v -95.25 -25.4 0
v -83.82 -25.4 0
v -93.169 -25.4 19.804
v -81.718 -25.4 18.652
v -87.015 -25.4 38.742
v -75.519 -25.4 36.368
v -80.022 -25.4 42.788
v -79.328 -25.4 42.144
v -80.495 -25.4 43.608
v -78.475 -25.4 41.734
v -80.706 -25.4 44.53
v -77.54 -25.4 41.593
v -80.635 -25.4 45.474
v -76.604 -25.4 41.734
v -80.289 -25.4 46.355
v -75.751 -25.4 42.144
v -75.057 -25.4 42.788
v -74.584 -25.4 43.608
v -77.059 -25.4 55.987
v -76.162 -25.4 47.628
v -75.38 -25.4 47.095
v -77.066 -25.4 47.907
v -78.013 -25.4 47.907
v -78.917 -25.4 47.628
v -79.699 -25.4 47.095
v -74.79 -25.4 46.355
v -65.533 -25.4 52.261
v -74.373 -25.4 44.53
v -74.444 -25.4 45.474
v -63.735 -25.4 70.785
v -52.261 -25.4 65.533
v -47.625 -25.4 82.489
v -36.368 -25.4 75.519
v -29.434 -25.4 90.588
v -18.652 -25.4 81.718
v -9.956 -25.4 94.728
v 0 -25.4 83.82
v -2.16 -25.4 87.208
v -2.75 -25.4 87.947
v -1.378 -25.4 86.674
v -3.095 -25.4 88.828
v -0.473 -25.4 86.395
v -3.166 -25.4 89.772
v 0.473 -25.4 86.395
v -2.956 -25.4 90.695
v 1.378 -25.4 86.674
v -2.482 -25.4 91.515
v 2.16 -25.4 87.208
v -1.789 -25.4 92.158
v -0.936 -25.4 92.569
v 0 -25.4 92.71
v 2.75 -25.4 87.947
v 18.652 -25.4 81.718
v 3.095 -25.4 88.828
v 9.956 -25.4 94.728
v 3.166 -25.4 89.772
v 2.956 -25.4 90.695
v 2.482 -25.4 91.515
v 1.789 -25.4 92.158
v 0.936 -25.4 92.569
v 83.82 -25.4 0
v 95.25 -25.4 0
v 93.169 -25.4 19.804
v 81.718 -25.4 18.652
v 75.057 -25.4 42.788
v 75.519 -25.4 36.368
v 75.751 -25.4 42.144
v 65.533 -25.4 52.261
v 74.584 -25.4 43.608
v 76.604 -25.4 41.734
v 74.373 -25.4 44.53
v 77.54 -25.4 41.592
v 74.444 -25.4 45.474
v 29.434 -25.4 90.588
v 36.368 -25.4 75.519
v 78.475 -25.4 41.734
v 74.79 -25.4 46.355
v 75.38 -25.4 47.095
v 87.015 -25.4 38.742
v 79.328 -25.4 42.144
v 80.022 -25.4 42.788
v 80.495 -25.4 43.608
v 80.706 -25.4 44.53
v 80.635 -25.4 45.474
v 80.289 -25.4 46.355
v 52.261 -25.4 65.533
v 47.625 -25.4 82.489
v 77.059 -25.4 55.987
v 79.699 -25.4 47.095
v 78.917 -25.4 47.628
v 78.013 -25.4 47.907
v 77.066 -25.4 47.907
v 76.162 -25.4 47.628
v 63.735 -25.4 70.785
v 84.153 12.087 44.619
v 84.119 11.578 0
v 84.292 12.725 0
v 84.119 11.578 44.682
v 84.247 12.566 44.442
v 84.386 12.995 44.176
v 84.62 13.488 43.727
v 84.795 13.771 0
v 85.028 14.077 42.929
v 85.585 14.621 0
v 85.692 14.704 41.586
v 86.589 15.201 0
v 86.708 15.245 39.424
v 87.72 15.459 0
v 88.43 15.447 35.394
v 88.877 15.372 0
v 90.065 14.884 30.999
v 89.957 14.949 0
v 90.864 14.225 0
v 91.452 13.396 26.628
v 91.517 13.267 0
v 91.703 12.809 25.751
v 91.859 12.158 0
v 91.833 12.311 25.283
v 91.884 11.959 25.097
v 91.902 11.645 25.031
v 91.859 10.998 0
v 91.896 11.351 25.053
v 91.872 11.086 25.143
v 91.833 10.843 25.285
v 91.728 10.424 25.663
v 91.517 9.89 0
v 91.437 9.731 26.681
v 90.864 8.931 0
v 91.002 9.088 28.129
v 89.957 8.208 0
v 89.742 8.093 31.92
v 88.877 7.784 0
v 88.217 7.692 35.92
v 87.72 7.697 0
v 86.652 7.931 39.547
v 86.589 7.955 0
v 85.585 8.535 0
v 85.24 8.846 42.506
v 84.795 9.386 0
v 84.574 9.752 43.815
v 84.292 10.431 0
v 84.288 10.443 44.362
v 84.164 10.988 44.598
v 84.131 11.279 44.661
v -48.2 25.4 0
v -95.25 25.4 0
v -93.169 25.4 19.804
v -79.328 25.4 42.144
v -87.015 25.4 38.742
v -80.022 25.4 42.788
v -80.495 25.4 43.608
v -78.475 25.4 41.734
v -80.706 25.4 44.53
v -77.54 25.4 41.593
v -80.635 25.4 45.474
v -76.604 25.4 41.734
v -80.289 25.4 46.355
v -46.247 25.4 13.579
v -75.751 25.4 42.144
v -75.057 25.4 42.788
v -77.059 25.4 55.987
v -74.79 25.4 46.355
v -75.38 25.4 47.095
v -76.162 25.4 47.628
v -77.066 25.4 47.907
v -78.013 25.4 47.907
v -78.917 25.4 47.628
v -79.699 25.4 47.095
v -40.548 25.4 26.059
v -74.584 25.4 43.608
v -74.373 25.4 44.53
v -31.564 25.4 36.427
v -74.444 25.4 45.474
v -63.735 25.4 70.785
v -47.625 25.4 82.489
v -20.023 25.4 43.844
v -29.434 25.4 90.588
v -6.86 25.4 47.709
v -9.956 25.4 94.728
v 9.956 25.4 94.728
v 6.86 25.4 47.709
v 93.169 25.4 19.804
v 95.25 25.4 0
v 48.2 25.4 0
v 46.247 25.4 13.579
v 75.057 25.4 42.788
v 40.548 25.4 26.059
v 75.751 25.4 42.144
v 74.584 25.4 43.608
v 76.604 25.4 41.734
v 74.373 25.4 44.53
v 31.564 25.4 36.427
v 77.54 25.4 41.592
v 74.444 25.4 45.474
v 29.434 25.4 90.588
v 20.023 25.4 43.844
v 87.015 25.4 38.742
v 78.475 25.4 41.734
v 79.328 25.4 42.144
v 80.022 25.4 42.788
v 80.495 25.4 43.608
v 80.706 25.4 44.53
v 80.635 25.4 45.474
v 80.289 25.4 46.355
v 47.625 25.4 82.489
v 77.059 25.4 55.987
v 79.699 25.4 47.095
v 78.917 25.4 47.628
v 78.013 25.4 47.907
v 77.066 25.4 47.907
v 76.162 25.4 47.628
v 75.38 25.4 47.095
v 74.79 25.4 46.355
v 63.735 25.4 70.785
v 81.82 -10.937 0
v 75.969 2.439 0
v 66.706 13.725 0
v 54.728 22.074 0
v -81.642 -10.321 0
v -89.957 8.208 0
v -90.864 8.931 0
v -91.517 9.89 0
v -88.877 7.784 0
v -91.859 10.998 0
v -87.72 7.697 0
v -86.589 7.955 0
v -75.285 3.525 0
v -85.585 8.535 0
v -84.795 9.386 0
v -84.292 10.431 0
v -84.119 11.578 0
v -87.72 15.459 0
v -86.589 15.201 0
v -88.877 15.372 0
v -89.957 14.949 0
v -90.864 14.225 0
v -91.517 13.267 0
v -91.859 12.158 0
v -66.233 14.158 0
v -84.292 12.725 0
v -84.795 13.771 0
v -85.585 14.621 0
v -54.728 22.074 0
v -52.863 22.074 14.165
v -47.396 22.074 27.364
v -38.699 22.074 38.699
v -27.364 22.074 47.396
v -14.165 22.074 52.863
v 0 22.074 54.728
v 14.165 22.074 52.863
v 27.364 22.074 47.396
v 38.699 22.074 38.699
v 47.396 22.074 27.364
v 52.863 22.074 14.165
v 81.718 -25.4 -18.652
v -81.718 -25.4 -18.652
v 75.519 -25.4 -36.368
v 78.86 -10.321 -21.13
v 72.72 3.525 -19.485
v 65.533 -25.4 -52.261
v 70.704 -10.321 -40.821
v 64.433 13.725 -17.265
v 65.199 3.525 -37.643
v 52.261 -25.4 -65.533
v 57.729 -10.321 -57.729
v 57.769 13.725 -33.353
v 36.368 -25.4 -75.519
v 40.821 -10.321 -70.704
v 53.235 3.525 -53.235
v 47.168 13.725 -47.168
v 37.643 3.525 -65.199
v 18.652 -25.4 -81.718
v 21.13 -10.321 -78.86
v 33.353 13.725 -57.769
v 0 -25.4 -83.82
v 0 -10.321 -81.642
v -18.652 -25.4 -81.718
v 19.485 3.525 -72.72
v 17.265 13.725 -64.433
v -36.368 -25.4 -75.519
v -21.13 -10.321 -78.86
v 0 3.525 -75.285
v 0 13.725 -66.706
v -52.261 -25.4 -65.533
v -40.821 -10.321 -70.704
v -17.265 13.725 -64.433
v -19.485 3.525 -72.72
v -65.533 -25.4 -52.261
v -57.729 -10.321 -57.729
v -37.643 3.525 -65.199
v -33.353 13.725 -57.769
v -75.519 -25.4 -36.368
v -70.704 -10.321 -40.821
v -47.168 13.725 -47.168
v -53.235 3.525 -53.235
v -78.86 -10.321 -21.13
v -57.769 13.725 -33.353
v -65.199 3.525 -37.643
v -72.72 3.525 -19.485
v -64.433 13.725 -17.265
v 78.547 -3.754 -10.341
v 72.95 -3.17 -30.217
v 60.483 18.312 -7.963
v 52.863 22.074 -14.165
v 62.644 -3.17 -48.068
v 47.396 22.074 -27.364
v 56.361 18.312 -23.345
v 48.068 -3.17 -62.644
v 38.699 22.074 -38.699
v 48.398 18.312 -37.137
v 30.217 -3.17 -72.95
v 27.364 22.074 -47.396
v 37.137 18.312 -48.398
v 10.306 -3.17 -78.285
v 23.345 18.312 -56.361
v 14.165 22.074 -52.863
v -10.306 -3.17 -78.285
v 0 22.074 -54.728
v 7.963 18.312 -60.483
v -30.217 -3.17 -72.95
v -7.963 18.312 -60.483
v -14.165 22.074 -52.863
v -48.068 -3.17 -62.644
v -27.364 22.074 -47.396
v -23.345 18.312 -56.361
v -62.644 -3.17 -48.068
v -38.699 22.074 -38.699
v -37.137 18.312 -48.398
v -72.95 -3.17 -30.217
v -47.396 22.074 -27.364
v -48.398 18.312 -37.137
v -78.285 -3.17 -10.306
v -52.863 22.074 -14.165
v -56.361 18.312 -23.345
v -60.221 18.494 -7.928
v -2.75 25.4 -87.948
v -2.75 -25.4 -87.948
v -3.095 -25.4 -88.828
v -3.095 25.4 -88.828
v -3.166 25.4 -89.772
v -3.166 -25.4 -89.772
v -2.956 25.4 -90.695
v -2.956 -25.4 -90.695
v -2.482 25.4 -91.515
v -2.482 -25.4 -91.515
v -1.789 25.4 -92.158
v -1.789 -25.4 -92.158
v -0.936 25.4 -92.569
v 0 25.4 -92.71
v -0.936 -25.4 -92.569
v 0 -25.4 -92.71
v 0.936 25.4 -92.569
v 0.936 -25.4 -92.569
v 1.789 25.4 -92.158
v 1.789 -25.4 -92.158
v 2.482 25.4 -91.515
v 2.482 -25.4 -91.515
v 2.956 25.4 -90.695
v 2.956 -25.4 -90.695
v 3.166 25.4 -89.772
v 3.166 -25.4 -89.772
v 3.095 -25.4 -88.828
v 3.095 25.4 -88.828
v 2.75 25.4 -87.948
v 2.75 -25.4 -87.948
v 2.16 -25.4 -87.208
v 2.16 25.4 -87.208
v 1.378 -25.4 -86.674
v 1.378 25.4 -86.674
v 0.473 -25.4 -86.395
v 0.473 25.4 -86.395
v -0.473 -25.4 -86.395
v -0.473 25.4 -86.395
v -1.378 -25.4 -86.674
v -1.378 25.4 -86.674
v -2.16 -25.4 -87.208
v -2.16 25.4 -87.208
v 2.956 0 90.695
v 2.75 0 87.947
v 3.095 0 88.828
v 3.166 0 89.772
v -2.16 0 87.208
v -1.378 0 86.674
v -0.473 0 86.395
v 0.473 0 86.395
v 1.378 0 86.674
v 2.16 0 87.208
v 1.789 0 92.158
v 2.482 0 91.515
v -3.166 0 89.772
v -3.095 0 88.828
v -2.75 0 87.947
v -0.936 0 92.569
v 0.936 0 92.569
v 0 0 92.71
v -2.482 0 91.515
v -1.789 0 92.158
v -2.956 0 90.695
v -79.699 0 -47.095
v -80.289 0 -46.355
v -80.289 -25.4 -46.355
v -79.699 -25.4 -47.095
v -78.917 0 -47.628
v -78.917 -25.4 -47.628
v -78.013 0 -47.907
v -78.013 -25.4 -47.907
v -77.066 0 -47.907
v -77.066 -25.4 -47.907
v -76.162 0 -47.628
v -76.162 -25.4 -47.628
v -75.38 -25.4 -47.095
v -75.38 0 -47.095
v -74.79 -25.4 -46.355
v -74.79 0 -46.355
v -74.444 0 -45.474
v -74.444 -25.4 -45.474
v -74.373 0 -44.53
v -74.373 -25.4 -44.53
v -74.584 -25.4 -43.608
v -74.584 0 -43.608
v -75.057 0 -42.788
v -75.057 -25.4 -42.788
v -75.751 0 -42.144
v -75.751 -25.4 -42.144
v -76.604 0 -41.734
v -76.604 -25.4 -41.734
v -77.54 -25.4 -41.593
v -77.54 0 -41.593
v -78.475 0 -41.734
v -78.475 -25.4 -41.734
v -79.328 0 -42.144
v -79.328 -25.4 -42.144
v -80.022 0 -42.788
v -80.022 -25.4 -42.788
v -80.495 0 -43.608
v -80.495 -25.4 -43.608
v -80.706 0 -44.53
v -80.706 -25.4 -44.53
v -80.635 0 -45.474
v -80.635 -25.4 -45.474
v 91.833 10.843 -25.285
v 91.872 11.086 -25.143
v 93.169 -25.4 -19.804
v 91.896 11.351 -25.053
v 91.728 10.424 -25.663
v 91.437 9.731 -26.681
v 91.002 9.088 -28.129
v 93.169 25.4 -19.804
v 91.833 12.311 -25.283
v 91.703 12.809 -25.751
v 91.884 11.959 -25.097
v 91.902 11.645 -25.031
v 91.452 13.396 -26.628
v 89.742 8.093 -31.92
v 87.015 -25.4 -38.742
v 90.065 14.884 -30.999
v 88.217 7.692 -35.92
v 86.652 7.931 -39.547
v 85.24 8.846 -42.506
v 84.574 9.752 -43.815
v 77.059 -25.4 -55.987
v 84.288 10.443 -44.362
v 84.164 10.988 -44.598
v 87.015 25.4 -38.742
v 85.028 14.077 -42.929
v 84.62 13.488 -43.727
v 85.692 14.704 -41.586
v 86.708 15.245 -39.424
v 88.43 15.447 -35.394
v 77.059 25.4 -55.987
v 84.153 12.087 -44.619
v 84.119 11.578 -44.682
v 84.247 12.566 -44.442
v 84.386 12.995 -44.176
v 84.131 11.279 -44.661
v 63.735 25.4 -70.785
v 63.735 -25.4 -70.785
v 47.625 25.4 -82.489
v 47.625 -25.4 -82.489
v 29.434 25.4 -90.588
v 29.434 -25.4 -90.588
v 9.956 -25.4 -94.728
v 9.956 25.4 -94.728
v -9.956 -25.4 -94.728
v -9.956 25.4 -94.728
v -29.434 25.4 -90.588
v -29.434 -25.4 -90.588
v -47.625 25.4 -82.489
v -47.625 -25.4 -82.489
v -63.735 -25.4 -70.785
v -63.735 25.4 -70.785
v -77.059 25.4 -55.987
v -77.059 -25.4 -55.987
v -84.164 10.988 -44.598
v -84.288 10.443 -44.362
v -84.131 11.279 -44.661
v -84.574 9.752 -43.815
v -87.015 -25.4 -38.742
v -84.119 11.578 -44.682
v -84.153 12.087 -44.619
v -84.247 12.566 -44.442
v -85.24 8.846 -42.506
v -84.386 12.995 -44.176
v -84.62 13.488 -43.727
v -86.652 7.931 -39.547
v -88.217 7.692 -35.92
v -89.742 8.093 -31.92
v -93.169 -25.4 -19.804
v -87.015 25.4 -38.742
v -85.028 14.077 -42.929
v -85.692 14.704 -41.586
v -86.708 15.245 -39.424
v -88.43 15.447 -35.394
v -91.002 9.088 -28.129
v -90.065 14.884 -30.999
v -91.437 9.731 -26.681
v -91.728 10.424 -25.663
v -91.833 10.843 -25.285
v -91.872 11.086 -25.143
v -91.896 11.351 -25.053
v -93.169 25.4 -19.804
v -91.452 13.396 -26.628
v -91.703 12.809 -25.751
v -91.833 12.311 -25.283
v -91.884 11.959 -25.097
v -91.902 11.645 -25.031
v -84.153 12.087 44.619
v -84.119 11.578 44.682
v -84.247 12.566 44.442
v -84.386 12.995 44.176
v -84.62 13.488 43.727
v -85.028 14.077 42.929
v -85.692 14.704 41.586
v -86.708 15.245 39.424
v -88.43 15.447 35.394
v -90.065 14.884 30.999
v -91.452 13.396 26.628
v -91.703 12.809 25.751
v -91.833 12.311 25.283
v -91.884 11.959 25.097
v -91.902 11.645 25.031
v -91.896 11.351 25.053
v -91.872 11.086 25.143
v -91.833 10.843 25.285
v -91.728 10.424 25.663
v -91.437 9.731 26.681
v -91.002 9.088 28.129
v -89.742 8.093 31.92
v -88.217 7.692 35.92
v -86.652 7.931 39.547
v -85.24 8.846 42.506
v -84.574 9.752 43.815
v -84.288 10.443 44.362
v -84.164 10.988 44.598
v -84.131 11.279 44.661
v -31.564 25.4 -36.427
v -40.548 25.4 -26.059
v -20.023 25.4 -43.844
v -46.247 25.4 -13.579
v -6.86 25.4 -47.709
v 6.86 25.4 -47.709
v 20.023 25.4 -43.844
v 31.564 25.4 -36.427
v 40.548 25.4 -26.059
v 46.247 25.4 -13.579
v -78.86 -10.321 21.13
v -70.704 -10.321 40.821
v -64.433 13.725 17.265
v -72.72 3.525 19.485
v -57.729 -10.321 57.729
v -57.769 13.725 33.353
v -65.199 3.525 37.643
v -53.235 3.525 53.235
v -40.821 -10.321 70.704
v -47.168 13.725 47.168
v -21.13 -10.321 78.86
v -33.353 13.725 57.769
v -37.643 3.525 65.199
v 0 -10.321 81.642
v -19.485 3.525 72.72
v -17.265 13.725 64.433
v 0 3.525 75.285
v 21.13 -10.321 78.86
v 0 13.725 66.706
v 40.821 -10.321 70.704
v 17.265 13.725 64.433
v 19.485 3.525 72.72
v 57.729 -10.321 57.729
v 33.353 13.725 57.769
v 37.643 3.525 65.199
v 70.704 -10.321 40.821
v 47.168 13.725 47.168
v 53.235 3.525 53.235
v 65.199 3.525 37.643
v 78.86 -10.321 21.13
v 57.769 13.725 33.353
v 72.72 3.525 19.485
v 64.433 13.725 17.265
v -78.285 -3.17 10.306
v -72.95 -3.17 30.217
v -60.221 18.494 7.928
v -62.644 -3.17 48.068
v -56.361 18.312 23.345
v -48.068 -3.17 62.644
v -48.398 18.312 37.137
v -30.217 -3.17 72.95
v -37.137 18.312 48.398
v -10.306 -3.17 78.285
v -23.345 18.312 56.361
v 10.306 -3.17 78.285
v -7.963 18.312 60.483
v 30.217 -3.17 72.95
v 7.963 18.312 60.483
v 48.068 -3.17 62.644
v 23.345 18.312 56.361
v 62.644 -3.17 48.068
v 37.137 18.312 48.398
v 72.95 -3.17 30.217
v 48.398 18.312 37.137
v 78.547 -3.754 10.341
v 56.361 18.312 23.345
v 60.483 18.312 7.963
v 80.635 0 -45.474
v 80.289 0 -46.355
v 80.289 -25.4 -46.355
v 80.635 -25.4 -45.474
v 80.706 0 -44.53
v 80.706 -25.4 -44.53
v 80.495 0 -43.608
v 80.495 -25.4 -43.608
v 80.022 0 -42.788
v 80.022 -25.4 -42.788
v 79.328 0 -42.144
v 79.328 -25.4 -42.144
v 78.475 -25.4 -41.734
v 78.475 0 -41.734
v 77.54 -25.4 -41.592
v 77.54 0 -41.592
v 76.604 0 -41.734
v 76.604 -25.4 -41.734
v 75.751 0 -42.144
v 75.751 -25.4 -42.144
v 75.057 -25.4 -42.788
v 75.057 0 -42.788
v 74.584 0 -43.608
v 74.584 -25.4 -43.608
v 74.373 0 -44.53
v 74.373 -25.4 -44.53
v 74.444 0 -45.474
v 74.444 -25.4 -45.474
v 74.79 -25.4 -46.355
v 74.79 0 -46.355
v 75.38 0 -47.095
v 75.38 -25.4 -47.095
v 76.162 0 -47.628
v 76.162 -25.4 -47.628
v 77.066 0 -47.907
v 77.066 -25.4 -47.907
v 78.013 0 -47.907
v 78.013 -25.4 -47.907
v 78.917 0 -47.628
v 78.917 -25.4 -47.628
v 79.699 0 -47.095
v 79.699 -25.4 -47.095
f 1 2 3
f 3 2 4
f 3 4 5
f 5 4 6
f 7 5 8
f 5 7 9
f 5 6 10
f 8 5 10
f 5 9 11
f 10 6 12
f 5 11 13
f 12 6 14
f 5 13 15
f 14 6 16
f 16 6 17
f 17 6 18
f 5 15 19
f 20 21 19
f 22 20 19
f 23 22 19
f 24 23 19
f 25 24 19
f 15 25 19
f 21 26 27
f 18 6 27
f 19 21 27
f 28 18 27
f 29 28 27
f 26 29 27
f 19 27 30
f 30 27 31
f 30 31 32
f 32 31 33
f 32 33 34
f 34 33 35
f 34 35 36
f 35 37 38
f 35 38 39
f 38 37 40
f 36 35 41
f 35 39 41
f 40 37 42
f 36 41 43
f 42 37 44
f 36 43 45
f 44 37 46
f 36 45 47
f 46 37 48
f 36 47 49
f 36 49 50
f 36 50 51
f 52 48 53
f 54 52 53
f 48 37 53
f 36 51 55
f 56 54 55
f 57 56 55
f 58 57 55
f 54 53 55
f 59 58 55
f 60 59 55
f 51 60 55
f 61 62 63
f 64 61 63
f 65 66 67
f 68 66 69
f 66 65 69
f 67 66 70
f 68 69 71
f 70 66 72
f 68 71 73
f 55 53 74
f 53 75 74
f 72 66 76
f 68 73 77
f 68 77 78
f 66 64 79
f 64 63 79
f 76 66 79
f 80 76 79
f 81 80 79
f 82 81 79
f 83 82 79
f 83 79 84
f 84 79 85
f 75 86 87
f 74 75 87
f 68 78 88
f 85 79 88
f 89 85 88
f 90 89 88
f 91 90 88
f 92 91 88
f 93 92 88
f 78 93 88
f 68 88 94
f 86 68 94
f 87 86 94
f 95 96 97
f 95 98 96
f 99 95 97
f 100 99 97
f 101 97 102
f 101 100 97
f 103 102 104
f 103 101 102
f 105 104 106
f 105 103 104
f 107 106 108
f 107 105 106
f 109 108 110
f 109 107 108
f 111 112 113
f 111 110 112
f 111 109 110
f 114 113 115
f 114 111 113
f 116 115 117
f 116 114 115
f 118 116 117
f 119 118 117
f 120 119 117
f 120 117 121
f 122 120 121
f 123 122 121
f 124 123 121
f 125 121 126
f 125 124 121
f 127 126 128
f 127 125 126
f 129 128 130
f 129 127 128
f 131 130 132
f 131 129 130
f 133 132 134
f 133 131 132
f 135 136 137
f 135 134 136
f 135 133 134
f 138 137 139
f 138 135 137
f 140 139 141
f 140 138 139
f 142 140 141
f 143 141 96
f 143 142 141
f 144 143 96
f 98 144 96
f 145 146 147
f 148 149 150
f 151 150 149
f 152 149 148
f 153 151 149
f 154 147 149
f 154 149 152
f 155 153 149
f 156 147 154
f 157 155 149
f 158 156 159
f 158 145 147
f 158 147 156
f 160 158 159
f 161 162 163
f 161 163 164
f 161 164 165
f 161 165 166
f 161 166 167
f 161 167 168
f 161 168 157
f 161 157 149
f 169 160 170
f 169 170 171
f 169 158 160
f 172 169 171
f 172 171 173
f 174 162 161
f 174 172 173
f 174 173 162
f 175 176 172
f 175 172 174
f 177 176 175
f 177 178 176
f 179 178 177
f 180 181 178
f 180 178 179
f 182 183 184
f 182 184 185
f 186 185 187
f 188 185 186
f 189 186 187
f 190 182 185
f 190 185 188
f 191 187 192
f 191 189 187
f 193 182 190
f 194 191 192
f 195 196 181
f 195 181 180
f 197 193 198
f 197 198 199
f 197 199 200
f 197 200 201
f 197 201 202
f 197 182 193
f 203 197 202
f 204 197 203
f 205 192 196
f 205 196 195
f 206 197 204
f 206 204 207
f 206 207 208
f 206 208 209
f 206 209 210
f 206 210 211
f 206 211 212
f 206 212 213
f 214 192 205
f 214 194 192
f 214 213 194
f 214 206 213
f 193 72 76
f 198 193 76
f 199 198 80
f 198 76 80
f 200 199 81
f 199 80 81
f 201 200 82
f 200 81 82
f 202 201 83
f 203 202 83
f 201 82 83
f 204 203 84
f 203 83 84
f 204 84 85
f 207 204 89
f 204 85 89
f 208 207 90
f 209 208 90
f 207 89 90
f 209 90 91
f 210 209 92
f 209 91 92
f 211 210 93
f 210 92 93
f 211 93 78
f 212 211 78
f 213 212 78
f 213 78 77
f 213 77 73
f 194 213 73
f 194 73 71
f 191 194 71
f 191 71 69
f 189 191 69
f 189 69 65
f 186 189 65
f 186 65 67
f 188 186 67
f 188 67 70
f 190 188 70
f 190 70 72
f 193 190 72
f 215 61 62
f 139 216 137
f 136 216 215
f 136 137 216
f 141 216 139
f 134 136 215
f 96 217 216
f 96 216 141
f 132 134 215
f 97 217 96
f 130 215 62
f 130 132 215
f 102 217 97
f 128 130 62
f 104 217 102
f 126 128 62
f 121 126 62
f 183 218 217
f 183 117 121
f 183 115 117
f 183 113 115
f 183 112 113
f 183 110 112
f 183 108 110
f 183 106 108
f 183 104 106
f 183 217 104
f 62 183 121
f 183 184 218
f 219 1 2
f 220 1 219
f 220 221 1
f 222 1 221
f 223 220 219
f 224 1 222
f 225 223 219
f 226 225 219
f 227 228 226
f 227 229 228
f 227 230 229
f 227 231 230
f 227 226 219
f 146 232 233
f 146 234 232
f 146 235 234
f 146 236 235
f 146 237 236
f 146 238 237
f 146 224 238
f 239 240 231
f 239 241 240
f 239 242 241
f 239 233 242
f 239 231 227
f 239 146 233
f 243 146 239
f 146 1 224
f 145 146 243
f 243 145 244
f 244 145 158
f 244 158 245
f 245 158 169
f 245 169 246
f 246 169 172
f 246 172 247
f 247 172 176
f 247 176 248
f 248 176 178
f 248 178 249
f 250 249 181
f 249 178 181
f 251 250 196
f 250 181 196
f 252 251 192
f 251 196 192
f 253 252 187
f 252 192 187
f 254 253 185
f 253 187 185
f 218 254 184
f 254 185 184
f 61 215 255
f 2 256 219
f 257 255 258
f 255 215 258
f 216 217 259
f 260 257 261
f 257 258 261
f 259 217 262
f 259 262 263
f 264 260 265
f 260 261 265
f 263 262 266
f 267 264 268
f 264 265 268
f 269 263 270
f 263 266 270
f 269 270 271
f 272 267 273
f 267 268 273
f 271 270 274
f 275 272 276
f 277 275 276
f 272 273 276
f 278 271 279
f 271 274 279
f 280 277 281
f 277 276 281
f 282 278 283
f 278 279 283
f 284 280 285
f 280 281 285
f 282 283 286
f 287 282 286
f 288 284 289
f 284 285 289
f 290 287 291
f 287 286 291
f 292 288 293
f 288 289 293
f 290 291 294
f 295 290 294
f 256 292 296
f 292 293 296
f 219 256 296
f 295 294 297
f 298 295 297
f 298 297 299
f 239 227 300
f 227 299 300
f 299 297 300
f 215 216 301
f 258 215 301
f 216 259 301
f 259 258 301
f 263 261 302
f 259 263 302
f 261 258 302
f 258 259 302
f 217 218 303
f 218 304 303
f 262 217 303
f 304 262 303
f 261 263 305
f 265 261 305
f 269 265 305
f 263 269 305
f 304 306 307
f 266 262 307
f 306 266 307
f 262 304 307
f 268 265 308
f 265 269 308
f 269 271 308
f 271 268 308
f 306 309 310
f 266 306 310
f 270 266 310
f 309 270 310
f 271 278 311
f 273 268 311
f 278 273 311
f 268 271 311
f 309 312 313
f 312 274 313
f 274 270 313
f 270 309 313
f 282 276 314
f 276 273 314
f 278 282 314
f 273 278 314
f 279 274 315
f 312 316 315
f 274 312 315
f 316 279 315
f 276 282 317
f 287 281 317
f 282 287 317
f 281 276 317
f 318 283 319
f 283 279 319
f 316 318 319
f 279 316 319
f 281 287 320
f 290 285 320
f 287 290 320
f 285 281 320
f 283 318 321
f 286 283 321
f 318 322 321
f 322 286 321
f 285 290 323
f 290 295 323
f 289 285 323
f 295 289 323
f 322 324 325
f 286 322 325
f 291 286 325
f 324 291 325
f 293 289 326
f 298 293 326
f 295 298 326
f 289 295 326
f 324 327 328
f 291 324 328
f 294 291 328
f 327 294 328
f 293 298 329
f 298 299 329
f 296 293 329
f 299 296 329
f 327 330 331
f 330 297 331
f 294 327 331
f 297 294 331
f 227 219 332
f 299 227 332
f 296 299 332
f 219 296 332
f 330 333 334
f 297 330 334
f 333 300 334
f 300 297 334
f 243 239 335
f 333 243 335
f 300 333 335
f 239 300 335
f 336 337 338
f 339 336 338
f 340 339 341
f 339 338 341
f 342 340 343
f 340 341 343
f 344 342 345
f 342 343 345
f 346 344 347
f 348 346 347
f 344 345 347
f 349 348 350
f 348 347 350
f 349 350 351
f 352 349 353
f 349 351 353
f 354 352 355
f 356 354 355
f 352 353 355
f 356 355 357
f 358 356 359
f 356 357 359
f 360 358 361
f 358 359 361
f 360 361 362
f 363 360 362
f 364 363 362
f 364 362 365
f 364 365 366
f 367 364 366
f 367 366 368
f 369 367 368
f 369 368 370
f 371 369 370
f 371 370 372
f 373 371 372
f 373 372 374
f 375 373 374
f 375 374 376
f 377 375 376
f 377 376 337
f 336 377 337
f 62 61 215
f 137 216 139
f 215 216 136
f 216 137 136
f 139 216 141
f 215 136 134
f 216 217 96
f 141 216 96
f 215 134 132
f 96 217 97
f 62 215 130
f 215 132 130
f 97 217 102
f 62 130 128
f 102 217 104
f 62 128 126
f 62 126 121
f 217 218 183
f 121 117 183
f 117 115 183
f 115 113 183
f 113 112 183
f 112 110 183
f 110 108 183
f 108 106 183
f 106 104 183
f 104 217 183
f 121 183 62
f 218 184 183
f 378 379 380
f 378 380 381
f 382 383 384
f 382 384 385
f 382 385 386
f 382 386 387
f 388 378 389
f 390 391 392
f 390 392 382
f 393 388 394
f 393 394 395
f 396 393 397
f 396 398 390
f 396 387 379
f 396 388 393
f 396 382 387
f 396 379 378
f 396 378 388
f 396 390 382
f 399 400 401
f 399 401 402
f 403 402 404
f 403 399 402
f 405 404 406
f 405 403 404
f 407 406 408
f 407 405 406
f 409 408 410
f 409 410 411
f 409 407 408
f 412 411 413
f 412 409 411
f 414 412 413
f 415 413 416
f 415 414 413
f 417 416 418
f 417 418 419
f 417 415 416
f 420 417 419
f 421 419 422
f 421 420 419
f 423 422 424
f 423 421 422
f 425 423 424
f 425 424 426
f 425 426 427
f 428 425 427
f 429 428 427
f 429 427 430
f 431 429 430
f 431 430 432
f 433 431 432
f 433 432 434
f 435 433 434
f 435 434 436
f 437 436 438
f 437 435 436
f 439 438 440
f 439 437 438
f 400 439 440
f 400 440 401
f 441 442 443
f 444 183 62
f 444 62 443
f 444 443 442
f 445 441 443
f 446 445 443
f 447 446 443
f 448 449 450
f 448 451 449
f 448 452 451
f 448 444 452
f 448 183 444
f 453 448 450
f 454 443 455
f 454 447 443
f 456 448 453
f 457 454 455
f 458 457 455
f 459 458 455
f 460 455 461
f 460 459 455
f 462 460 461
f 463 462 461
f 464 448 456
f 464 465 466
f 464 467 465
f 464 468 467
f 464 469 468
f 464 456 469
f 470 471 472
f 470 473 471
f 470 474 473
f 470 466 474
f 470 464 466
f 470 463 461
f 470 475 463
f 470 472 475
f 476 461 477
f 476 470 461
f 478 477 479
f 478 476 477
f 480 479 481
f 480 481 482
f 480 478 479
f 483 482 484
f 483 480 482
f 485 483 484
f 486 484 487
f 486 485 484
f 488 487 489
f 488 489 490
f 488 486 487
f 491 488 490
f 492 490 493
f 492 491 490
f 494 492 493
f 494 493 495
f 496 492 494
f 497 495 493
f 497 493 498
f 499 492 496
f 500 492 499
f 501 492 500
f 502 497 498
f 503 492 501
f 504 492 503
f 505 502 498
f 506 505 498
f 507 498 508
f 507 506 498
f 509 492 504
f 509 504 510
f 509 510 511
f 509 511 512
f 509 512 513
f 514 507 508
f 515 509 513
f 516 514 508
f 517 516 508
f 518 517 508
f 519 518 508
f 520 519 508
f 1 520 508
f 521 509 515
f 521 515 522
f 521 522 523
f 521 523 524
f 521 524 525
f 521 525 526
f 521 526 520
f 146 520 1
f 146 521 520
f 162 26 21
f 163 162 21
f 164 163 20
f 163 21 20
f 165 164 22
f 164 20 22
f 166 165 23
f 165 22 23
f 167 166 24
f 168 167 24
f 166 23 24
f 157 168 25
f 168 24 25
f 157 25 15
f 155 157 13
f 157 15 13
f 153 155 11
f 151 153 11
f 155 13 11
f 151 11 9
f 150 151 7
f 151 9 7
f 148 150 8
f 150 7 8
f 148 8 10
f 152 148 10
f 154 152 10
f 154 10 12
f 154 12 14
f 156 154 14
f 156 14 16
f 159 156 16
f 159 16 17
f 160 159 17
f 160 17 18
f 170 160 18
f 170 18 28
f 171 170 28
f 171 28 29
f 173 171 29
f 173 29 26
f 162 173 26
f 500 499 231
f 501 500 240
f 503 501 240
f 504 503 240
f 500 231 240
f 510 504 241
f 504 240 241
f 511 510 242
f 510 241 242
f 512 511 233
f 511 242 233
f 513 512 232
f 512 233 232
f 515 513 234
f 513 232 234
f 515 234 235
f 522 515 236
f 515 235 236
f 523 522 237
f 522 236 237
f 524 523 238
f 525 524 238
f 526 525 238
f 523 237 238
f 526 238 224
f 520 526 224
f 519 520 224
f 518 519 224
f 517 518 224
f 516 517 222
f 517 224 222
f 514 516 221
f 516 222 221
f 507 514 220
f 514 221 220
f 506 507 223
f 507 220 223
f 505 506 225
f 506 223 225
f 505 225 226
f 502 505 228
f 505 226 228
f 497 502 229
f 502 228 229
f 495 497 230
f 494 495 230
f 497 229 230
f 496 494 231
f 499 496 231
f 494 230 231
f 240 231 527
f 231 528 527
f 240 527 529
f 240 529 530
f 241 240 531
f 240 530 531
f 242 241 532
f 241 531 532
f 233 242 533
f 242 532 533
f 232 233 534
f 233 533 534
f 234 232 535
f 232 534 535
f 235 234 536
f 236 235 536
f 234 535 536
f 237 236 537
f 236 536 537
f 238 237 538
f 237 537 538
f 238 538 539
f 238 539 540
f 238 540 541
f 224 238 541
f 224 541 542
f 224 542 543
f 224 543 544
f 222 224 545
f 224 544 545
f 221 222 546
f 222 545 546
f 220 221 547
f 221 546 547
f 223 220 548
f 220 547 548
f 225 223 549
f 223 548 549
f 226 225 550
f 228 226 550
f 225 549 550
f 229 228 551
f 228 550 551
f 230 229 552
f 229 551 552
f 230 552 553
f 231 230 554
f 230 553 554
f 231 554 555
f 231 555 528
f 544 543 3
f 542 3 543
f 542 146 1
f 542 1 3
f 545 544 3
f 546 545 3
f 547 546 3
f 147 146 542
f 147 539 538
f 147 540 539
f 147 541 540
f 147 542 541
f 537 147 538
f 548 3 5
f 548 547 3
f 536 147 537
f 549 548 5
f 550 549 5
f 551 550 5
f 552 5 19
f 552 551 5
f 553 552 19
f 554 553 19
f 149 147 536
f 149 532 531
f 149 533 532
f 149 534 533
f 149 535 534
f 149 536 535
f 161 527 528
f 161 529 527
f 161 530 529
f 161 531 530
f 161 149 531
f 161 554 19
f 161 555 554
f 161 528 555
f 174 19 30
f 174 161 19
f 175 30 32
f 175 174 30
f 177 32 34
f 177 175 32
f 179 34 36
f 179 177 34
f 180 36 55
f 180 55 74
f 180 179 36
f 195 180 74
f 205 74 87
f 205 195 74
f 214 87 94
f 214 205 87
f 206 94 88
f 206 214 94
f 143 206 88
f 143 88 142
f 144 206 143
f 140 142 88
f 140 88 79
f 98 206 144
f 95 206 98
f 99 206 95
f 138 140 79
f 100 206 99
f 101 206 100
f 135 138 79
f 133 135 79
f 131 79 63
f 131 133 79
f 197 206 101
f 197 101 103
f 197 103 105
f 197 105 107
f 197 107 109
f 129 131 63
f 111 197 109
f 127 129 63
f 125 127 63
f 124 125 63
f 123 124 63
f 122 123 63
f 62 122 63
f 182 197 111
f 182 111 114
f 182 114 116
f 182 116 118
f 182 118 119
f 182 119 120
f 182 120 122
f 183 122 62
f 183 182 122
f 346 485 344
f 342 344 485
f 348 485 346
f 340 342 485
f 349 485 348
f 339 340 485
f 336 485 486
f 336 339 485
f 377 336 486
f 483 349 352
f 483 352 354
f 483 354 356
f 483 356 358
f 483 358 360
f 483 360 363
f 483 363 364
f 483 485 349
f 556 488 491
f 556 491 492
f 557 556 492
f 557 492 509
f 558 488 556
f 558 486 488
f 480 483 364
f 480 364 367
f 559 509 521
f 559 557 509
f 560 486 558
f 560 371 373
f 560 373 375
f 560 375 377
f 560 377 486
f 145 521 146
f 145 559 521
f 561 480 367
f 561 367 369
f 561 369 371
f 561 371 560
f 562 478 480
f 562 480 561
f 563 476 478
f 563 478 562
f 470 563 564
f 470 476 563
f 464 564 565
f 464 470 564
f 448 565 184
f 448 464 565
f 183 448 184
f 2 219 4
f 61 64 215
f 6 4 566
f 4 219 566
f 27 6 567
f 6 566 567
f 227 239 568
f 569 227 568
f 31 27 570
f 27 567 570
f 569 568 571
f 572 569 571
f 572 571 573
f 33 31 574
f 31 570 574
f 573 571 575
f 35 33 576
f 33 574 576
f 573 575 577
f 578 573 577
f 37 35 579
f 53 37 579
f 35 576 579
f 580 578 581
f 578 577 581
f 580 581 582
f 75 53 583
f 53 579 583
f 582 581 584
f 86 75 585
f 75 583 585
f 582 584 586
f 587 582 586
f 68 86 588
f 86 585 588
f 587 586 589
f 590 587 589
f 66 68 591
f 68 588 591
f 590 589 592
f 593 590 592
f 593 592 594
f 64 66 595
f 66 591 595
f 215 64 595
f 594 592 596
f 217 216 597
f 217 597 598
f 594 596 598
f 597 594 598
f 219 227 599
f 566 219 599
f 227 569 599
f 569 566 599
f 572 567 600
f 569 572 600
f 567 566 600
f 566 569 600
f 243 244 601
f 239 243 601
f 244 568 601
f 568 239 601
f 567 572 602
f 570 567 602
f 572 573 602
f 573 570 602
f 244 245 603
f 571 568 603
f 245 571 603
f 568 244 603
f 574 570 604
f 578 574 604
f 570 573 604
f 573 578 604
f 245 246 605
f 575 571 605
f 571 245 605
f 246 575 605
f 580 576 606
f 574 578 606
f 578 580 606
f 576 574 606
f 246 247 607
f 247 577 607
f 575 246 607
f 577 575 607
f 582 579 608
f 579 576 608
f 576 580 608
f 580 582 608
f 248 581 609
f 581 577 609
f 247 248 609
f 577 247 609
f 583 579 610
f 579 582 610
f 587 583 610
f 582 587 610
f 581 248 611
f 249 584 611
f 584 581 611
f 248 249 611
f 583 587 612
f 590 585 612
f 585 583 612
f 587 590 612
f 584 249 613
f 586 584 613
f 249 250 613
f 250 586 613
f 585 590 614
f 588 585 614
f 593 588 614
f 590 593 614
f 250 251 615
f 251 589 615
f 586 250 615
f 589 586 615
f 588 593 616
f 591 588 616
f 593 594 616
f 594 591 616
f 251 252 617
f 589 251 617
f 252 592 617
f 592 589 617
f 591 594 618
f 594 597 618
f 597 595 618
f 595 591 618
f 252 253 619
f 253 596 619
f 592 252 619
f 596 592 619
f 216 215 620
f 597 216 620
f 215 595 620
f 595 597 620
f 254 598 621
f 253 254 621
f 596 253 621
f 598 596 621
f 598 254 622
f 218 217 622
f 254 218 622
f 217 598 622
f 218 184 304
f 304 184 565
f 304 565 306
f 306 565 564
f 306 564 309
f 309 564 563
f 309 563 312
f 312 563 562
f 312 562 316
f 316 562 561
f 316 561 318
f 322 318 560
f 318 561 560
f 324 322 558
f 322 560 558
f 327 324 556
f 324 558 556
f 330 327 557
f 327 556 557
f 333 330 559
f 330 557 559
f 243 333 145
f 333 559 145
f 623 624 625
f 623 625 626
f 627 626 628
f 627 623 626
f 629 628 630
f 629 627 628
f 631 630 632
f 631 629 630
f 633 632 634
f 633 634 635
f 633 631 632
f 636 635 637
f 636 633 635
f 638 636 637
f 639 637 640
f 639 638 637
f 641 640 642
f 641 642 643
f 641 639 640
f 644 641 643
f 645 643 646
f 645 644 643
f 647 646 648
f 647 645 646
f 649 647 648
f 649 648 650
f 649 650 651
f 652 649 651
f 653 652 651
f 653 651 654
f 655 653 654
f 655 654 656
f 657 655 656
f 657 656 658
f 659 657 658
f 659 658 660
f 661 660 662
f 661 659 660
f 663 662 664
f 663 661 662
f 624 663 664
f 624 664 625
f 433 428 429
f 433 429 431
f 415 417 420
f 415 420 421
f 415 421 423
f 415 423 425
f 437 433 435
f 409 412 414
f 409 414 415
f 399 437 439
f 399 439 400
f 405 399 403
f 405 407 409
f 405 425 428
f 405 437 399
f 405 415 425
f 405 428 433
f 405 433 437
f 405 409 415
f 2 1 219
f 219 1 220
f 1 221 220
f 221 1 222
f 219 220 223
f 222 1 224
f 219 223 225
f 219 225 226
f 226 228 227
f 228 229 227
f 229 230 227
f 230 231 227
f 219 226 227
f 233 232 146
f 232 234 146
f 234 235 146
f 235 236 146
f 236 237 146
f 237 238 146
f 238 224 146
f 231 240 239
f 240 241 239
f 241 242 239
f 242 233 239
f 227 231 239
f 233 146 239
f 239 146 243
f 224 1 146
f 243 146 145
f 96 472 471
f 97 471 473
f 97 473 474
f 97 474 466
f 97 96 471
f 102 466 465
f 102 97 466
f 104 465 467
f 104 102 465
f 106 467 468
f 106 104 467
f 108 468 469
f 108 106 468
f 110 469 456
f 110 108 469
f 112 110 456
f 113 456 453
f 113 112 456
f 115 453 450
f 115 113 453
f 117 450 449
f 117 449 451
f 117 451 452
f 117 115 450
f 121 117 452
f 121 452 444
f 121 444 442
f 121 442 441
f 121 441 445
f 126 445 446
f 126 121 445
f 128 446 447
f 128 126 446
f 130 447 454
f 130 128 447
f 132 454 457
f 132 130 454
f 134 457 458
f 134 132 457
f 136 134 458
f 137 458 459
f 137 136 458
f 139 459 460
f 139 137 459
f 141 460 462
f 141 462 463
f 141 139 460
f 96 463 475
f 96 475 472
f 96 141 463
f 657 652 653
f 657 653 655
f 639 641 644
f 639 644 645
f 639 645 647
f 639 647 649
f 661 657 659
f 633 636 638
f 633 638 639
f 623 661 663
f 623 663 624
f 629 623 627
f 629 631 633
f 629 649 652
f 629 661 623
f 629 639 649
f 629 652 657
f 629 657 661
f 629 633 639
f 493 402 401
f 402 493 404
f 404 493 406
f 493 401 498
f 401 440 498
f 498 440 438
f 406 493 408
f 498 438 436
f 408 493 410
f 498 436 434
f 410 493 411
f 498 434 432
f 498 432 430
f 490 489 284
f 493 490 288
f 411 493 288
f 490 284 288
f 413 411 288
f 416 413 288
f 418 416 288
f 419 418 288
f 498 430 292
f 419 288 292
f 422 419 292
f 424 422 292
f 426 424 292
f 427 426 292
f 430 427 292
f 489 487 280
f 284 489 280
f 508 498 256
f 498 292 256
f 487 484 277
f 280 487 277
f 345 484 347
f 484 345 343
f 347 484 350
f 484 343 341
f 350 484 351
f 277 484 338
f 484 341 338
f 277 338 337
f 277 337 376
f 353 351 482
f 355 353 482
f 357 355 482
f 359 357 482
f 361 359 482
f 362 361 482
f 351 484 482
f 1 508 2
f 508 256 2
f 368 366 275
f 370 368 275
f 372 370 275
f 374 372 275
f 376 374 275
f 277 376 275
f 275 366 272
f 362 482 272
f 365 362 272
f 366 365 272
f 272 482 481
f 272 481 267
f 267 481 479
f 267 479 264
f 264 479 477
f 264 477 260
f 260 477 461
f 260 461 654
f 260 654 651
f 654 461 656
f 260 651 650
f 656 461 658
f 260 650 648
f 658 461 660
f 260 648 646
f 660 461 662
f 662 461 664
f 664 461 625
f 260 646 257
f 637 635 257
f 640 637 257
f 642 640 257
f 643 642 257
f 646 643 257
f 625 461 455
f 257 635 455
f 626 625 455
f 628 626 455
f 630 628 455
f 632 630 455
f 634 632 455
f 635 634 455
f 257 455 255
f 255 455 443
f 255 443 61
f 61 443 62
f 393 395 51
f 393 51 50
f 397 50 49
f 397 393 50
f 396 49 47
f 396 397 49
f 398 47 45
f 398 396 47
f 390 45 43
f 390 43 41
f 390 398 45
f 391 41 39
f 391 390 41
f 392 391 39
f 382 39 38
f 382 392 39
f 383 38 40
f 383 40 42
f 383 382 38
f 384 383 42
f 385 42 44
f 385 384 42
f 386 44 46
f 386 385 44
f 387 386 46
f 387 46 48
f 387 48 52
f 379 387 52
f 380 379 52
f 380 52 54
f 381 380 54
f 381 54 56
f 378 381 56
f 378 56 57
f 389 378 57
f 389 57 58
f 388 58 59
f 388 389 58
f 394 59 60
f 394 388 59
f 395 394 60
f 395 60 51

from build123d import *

# Parameters (mm, degrees)
SKETCH1_R           = 95.25
BOSS_EXTRUDE1_DEPTH = 25.4
CUT_EXTRUDE3_START  = -25.4
SKETCH6_R           = 3.175
CUT_EXTRUDE3_DEPTH  = 25.4
CIRPATTERN1_COUNT   = 3
SKETCH7_R           = 3.175
CUT_EXTRUDE4_DEPTH  = 144.964457521
CIRPATTERN2_COUNT   = 3
SKETCH8_R           = 3.891794663
CUT_EXTRUDE5_DEPTH  = 63.5


# Read off the part's stored shape, not the designer's step: Cavity1
with BuildPart() as part:
    # Sketch1 → Boss-Extrude1 (new, symmetric)
    with BuildSketch(Plane(origin=(0, 0, 0), x_dir=(1, 0, 0), z_dir=(0, 1, 0))):
        with Locations(Location((0, 0, 0), (0, 0, 270))):
            Circle(SKETCH1_R)
    extrude(amount=BOSS_EXTRUDE1_DEPTH, both=True)

    # Cavity1 outline → Cavity1 (revolve, cut)
    with BuildSketch(Plane.XY):
        with BuildLine():
            Line((0, -25.4), (83.820002599, -25.4))
            ThreePointArc((83.820002599, -25.4), (75.968533234, 2.439210437), (54.728107607, 22.073657924))
            Line((54.728107607, 22.073657924), (48.199793705, 25.4))
            Line((48.199793705, 25.4), (0, 25.4))
            Line((0, 25.4), (0, -25.4))
        make_face()
    revolve(axis=Axis((0, 0, 0), (0, 1, 0)), mode=Mode.SUBTRACT)


with BuildPart() as body_2:
    # Split1: the piece on the far side of the plane
    add(part.part)
    split(bisect_by=Plane.XY, keep=Keep.BOTTOM)


with BuildPart() as part_1:
    add(part.part)

    # Split1
    split(bisect_by=Plane.XY, keep=Keep.TOP)

    # Sketch6 → Cut-Extrude3 (cut)
    with BuildSketch(Plane(origin=(0, -25.4, 0), x_dir=(-1, 0, 0), z_dir=(0, -1, 0)).offset(CUT_EXTRUDE3_START)):
        with Locations(Location((0, -89.535, 0), (0, 0, 270))):
            Circle(SKETCH6_R)
    cut_extrude3 = extrude(amount=CUT_EXTRUDE3_DEPTH, mode=Mode.SUBTRACT)

    # Sketch7 → Cut-Extrude4 (cut, through all)
    with BuildSketch(Plane(origin=(0, -25.4, 0), x_dir=(-1, 0, 0), z_dir=(0, -1, 0))):
        with Locations(Location((-77.539584528, -44.7675, 0), (0, 0, 90))):
            Circle(SKETCH7_R)
    cut_extrude4 = extrude(amount=-CUT_EXTRUDE4_DEPTH, mode=Mode.SUBTRACT)


with BuildPart() as body_2_1:
    add(body_2.part)

    # CirPattern1: Cut-Extrude3 ×3 about axis
    cirpattern1_axis = Axis((0, 0, 0), (0, 1, 0))
    for i in range(1, CIRPATTERN1_COUNT):
        add(cut_extrude3.rotate(cirpattern1_axis, i * 360 / CIRPATTERN1_COUNT), mode=Mode.SUBTRACT)


with BuildPart() as cirpattern2_tool:
    # CirPattern2: Cut-Extrude4 ×3 about axis
    cirpattern2_axis = Axis((0, 0, 0), (0, 1, 0))
    for i in range(1, CIRPATTERN2_COUNT):
        add(cut_extrude4.rotate(cirpattern2_axis, i * 360 / CIRPATTERN2_COUNT))


with BuildPart() as part_2:
    add(part_1.part)

    # CirPattern2: cut by cirpattern2_tool
    add(cirpattern2_tool.part, mode=Mode.SUBTRACT)


with BuildPart() as body_2_2:
    add(body_2_1.part)

    # CirPattern2: cut by cirpattern2_tool
    add(cirpattern2_tool.part, mode=Mode.SUBTRACT)


with BuildPart() as cut_extrude5_tool:
    # Sketch8 → Cut-Extrude5 (new, symmetric)
    with BuildSketch(Plane.XY):
        with Locations((-88.011, 11.578188828)):
            Circle(SKETCH8_R)
    cut_extrude5 = extrude(amount=CUT_EXTRUDE5_DEPTH, both=True)


with BuildPart() as part_3:
    add(part_2.part)

    # Cut-Extrude5: cut by cut_extrude5_tool
    add(cut_extrude5_tool.part, mode=Mode.SUBTRACT)


with BuildPart() as body_2_3:
    add(body_2_2.part)

    # Cut-Extrude5: cut by cut_extrude5_tool
    add(cut_extrude5_tool.part, mode=Mode.SUBTRACT)


with BuildPart() as mirror1_tool:
    # Mirror1: Cut-Extrude5 across plane
    add(cut_extrude5.mirror(Plane(origin=(0, 0, 0), x_dir=(0, 0, 1), z_dir=(1, 0, 0))))


with BuildPart() as part_4:
    add(part_3.part)

    # Mirror1: cut by mirror1_tool
    add(mirror1_tool.part, mode=Mode.SUBTRACT)


with BuildPart() as body_2_4:
    add(body_2_3.part)

    # Mirror1: cut by mirror1_tool
    add(mirror1_tool.part, mode=Mode.SUBTRACT)


solid = Compound([part_4.part, body_2_4.part])
